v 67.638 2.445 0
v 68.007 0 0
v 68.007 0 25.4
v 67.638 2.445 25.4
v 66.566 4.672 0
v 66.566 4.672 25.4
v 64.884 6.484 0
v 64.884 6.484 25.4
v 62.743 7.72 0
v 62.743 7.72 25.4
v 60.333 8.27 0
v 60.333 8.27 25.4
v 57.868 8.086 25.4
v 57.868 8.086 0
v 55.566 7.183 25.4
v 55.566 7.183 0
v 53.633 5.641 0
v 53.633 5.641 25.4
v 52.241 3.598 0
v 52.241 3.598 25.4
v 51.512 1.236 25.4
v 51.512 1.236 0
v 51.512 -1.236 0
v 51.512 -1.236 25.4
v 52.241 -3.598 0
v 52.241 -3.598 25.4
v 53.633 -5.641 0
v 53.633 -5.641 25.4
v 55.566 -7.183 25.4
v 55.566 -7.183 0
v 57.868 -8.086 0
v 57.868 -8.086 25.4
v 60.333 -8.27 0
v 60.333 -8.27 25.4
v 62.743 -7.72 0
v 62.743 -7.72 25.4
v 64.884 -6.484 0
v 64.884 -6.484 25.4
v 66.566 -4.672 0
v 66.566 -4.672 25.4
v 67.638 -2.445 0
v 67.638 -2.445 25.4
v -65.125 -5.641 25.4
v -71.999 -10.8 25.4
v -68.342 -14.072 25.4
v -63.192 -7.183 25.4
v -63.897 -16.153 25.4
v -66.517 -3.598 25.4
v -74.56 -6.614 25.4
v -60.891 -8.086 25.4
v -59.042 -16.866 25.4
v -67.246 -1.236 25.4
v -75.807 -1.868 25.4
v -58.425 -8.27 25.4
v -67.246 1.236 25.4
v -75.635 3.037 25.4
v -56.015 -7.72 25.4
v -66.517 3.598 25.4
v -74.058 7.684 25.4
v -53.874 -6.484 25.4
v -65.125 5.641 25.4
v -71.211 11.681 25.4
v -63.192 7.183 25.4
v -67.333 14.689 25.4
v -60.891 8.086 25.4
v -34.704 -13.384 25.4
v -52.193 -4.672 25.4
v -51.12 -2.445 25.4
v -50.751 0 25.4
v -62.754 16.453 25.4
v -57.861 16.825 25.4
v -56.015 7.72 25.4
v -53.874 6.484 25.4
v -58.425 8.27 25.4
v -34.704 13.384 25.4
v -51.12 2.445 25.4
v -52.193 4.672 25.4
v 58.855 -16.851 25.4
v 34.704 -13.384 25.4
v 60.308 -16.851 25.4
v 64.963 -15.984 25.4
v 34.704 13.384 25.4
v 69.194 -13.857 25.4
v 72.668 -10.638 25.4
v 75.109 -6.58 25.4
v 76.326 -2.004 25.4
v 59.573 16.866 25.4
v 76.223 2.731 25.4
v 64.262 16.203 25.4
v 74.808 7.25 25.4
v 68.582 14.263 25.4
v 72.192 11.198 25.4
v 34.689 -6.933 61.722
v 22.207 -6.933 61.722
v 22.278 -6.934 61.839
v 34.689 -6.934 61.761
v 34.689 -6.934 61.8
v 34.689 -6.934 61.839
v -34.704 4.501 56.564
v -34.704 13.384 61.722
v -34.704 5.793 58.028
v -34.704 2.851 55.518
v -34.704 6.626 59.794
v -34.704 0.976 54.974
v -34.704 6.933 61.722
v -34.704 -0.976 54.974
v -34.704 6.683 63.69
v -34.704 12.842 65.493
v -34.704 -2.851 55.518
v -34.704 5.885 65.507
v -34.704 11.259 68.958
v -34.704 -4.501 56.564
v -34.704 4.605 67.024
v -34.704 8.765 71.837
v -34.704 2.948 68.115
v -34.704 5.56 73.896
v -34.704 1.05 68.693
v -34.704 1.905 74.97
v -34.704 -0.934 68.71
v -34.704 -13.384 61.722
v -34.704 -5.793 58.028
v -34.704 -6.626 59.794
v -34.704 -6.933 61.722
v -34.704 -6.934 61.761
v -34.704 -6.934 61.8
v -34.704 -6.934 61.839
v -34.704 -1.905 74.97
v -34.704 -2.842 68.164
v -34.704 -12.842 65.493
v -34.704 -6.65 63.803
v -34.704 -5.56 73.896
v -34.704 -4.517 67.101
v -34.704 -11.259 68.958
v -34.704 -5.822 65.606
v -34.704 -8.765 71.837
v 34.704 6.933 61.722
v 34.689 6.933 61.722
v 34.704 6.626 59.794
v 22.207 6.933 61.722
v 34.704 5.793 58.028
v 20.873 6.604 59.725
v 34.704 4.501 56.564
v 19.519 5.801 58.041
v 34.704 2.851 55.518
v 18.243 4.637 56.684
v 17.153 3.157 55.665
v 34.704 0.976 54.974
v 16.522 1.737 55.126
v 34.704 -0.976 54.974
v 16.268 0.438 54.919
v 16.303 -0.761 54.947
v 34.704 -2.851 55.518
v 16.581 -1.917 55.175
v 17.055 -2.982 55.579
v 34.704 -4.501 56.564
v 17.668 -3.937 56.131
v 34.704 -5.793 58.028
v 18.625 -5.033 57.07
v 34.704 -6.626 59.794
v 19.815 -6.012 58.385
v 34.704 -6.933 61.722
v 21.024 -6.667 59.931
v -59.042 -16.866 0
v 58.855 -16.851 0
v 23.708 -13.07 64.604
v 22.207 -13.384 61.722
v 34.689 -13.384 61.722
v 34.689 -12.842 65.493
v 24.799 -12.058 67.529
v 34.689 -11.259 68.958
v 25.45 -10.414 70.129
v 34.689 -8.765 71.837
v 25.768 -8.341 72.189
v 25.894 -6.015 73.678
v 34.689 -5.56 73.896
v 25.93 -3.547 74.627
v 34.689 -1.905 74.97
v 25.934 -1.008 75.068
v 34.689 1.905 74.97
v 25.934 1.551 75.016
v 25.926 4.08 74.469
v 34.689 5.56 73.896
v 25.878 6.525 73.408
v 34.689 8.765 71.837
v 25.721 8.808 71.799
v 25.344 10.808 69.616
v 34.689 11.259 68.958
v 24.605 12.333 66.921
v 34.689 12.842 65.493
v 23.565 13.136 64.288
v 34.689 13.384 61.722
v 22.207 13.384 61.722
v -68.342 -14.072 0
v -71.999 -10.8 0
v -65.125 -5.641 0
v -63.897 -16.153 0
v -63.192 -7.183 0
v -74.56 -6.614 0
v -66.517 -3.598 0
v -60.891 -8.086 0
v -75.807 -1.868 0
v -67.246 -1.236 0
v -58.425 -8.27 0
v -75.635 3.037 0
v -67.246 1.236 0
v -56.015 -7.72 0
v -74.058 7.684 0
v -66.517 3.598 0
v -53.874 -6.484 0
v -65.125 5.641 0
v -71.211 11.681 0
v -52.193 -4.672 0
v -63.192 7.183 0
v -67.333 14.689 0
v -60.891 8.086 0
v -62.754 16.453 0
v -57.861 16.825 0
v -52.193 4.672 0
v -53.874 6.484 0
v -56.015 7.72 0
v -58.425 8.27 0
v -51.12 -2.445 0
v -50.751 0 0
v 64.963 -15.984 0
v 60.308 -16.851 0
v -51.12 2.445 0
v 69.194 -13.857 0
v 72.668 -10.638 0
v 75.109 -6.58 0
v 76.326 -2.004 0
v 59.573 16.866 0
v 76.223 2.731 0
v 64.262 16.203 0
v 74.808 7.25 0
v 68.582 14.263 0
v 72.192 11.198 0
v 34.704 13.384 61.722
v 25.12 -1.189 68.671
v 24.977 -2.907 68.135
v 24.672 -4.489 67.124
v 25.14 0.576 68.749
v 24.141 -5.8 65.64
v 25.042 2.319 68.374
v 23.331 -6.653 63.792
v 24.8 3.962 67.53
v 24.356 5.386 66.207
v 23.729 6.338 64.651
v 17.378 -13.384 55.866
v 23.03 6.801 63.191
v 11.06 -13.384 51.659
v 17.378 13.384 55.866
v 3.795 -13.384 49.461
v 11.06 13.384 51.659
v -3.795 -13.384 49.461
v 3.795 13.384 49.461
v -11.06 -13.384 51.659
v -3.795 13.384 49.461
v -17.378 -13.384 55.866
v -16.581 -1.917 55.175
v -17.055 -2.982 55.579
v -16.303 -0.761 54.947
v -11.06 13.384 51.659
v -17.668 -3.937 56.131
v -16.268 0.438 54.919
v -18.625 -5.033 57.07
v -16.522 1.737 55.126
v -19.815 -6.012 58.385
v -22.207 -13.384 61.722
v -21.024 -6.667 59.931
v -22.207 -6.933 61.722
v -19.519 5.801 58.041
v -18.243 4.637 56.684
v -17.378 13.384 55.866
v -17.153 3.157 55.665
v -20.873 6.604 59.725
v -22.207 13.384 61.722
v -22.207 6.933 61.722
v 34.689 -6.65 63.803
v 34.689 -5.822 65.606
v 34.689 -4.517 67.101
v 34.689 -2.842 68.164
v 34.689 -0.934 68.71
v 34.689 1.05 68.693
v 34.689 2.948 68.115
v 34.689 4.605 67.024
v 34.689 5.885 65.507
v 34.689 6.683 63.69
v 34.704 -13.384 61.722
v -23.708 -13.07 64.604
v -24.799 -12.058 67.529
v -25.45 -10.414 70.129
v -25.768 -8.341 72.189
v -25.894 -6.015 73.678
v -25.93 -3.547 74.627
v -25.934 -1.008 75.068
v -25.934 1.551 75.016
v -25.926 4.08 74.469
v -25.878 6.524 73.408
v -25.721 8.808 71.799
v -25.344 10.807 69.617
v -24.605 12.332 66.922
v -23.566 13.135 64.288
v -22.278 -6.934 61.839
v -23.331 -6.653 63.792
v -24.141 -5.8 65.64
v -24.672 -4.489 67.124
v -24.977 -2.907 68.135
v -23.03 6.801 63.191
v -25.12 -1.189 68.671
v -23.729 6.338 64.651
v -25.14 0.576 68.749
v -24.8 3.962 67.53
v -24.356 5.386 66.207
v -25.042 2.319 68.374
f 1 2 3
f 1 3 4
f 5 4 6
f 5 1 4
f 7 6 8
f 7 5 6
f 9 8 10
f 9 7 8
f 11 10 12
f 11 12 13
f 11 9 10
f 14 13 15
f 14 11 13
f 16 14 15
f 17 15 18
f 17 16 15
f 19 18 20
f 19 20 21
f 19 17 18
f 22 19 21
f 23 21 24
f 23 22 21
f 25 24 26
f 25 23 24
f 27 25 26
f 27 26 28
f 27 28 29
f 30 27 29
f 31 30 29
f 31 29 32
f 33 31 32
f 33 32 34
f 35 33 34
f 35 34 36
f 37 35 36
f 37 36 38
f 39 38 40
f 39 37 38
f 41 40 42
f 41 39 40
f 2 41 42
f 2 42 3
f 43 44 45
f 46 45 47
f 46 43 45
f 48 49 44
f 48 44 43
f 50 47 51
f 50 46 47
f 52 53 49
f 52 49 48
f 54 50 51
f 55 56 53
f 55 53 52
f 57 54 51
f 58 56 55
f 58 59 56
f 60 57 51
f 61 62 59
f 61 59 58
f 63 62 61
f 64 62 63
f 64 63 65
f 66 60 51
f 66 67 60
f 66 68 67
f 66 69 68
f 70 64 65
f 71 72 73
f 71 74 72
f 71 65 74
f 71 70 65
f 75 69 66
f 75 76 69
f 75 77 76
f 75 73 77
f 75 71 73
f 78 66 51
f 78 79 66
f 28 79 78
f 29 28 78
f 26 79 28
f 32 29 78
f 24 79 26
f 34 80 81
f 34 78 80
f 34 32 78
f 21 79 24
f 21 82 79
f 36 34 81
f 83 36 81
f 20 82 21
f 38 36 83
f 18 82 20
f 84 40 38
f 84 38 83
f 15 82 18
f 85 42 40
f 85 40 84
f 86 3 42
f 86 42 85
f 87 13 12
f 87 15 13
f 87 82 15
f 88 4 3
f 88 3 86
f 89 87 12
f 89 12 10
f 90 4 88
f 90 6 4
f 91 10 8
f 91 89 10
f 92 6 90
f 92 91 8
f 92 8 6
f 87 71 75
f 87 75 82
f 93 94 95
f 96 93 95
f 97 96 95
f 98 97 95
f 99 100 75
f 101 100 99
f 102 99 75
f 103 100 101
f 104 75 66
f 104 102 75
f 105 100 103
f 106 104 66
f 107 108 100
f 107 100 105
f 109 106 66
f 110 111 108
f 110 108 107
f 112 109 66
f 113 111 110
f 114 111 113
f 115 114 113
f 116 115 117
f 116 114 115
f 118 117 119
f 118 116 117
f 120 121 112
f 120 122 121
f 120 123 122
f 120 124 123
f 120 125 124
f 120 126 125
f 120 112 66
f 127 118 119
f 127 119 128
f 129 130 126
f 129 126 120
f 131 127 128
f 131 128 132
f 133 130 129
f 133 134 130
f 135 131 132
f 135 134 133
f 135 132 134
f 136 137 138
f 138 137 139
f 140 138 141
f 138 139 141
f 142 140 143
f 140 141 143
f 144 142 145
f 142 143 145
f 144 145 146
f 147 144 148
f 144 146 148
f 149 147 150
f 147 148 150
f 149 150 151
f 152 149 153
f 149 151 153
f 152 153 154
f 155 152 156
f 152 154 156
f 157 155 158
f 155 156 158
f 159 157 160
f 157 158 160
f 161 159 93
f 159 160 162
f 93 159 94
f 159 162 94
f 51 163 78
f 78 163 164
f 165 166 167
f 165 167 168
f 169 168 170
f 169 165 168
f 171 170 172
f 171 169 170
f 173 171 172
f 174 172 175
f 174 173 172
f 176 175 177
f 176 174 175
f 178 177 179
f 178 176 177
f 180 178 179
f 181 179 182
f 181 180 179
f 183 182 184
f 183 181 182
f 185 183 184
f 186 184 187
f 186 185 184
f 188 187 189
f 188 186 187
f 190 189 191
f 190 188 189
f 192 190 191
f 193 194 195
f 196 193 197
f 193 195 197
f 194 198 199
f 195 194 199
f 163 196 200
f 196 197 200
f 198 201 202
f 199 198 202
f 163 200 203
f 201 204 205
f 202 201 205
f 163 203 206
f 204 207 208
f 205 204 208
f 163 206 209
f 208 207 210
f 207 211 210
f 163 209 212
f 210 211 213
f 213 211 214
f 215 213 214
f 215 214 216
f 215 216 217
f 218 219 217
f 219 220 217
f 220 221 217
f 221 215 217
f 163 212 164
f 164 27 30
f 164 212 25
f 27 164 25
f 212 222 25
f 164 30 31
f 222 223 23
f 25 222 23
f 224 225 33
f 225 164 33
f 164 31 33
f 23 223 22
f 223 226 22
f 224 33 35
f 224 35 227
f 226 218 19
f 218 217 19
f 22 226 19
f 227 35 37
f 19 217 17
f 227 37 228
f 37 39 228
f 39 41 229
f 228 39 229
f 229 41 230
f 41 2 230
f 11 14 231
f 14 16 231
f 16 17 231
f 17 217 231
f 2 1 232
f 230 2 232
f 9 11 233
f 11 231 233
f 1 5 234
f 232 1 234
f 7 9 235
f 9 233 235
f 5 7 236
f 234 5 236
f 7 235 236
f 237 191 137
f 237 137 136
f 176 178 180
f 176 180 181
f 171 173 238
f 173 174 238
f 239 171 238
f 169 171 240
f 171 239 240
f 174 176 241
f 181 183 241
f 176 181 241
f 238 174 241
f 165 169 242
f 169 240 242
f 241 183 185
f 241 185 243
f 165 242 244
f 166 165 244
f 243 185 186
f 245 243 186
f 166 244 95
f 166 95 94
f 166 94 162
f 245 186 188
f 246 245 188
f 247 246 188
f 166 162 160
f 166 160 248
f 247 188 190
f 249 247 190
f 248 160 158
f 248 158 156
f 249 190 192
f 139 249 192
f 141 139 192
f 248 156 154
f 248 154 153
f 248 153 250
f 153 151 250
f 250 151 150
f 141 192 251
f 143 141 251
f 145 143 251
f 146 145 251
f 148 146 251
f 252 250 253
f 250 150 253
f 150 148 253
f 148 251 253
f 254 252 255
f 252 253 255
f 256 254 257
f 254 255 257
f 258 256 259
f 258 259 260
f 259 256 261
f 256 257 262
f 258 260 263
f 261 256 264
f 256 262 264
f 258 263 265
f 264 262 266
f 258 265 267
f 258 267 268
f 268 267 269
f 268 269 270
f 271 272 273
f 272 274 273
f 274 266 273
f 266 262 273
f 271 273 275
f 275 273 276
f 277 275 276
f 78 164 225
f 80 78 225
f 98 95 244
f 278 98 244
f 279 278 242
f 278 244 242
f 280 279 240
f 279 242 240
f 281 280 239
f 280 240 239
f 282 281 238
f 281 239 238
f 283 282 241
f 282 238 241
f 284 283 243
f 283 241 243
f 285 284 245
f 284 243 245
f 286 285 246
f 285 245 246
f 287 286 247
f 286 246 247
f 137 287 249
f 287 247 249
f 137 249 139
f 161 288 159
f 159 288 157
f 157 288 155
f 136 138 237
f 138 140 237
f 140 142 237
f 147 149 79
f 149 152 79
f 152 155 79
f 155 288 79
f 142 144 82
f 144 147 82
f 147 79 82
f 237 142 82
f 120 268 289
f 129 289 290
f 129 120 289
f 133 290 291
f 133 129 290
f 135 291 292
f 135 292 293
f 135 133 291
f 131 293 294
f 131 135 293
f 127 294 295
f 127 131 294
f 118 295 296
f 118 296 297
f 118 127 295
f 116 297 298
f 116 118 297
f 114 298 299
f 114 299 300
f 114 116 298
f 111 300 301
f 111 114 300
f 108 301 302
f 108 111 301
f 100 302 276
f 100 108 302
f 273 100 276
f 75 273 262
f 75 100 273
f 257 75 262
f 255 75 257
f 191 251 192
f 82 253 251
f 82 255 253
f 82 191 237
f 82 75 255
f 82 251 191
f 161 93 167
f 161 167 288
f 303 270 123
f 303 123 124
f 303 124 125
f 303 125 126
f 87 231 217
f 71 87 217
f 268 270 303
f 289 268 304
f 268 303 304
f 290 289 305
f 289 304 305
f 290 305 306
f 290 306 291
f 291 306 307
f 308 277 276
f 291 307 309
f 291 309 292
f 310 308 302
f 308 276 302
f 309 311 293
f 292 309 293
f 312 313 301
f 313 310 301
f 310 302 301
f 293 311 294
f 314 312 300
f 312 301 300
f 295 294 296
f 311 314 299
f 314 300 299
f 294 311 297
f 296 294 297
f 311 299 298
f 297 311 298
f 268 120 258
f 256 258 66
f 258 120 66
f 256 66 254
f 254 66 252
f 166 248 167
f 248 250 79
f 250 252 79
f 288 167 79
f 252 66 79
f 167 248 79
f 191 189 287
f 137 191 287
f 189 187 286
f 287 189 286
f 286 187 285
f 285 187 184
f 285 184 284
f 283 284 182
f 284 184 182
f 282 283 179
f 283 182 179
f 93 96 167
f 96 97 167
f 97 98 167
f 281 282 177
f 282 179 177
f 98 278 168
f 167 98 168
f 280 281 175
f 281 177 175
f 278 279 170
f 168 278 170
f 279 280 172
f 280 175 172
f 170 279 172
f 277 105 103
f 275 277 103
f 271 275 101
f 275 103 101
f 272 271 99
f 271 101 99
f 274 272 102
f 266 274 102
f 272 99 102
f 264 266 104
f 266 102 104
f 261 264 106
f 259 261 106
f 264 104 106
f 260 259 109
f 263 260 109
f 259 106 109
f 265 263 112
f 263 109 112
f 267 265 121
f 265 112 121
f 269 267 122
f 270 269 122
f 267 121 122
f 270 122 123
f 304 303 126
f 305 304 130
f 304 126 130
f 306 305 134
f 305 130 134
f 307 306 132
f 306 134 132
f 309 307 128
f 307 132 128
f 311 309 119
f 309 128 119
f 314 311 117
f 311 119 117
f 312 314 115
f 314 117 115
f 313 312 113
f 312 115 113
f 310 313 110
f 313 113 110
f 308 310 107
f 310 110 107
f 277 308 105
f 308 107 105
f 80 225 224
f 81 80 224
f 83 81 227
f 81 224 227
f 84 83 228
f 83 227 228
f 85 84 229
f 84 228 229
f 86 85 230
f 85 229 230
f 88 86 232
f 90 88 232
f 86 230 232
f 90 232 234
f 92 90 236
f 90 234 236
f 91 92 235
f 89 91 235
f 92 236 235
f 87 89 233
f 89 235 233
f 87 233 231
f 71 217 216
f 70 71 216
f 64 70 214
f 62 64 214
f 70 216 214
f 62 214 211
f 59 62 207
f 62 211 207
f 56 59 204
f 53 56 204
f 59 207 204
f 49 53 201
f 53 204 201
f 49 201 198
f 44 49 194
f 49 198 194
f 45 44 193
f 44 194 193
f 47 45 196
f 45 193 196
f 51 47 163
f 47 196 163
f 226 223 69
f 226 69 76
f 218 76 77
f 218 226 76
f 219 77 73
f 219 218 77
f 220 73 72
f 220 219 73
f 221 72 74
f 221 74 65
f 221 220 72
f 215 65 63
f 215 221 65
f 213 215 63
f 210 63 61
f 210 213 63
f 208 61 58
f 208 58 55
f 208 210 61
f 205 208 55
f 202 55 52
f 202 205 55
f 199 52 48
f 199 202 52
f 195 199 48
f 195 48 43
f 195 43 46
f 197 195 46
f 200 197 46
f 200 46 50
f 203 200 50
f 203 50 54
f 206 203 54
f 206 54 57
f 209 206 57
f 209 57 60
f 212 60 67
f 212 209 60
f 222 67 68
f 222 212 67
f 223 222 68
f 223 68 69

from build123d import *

# Parameters (mm, degrees)
F1_R      = 8.2936411115
F2_DEPTH  = 25.4
F3_W      = 69.4077983499
F3_H      = 26.76769346
F4_DEPTH  = 36.322
F7_DEPTH  = 69.3928
F8_DEPTH  = 100.584
F10_DEPTH = 29.464


with BuildPart() as f2:
    # F1 (on face) → F2 (new body)
    with BuildSketch(Plane.XY):
        with BuildLine():
            ThreePointArc((60.3076215597, -16.8506682543), (76.4416354881, 0.3672646239), (59.5732608546, 16.8664026399))
            Line((59.5732608546, 16.8664026399), (-57.860675973, 16.8248360129))
            ThreePointArc((-57.860675973, 16.8248360129), (-75.9001367339, 0.5909603363), (-59.041865465, -16.8664035499))
            Line((-59.041865465, -16.8664035499), (58.8552834129, -16.8508597338))
            Line((58.8552834129, -16.8508597338), (60.3076215597, -16.8506682543))
        make_face()
        with Locations((-59.0450726449, 0)):
            Circle(F1_R, mode=Mode.SUBTRACT)
        with Locations((59.7131252289, 0)):
            Circle(F1_R, mode=Mode.SUBTRACT)
    extrude(amount=F2_DEPTH)

    # F3 (on face) → F4 (join)
    with BuildSketch(Plane.XY.offset(25.4)):
        Rectangle(F3_W, F3_H)
    extrude(amount=F4_DEPTH)

    # F5 (on face) → F7 (join)
    with BuildSketch(Plane(origin=(-34.7038991749, 0, 0), x_dir=(0, -1, 0), z_dir=(-1, 0, 0))):
        with BuildLine():
            Line((-13.38384673, 61.722), (13.38384673, 61.722))
            ThreePointArc((13.38384673, 61.722), (0, 75.10584673), (-13.38384673, 61.722))
        make_face()
    extrude(amount=-F7_DEPTH)

    # F6 (on face) → F8 (cut)
    with BuildSketch(Plane(origin=(-34.7038991749, 0, 0), x_dir=(0, -1, 0), z_dir=(-1, 0, 0))):
        with BuildLine():
            Line((6.9332089114, 61.722), (-6.9332089114, 61.722))
            ThreePointArc((-6.9332089114, 61.722), (0, 54.9050340839), (6.9332089114, 61.722))
        make_face()
        with BuildLine():
            ThreePointArc((6.9332089114, 61.722), (6.9339522234, 61.7806149473), (6.9342, 61.8392340839))
            ThreePointArc((6.9342, 61.8392340839), (-0.0586191366, 68.7731863073), (-6.9332089114, 61.722))
            Line((-6.9332089114, 61.722), (6.9332089114, 61.722))
        make_face()
    extrude(amount=-F8_DEPTH, mode=Mode.SUBTRACT)

    # F9 (on face) → F10 (cut)
    with BuildSketch(Plane(origin=(0, 13.38384673, 0), x_dir=(-1, 0, 0), z_dir=(0, 1, 0))):
        with BuildLine():
            ThreePointArc((22.2074646178, 61.722), (24.9850855062, 68.1647563019), (25.9341114011, 75.116276741))
            ThreePointArc((25.9341114011, 75.116276741), (-6.9515204391, 100.1013622472), (-22.2074646178, 61.722))
            Line((-22.2074646178, 61.722), (22.2074646178, 61.722))
        make_face()
        with BuildLine():
            Line((22.2074646178, 61.722), (-22.2074646178, 61.722))
            ThreePointArc((-22.2074646178, 61.722), (0, 49.1821653399), (22.2074646178, 61.722))
        make_face()
    extrude(amount=-F10_DEPTH, mode=Mode.SUBTRACT)


solid = f2.part
